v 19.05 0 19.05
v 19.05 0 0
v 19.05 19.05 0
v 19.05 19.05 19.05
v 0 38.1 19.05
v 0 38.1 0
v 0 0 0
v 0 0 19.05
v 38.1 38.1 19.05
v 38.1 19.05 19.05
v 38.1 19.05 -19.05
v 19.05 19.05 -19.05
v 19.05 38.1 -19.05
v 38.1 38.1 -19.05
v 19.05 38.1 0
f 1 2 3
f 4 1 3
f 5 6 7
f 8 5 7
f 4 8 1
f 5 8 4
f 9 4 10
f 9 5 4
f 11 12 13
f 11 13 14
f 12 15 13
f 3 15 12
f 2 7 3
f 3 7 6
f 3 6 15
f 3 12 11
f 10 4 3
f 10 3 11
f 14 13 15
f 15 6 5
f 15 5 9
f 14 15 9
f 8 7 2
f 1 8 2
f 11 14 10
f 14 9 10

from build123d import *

# Parameters (mm, degrees)
F1_DEPTH = 19.05
F2_W     = 19.05
F2_H     = 19.05
F3_DEPTH = 19.05


with BuildPart() as f1:
    # F0 (on Top) → F1 (new body)
    with BuildSketch(Plane.XY):
        Polygon((0, 38.1), (0, 0), (19.05, 0), (19.05, 19.05), (38.1, 19.05), (38.1, 38.1), align=None)
    extrude(amount=F1_DEPTH)

    # F2 (on face) → F3 (join)
    with BuildSketch(Plane(origin=(0, 0, 0), x_dir=(1, 0, 0), z_dir=(0, 0, -1))):
        with Locations((28.575, -28.575)):
            Rectangle(F2_W, F2_H)
    extrude(amount=F3_DEPTH)


solid = f1.part
